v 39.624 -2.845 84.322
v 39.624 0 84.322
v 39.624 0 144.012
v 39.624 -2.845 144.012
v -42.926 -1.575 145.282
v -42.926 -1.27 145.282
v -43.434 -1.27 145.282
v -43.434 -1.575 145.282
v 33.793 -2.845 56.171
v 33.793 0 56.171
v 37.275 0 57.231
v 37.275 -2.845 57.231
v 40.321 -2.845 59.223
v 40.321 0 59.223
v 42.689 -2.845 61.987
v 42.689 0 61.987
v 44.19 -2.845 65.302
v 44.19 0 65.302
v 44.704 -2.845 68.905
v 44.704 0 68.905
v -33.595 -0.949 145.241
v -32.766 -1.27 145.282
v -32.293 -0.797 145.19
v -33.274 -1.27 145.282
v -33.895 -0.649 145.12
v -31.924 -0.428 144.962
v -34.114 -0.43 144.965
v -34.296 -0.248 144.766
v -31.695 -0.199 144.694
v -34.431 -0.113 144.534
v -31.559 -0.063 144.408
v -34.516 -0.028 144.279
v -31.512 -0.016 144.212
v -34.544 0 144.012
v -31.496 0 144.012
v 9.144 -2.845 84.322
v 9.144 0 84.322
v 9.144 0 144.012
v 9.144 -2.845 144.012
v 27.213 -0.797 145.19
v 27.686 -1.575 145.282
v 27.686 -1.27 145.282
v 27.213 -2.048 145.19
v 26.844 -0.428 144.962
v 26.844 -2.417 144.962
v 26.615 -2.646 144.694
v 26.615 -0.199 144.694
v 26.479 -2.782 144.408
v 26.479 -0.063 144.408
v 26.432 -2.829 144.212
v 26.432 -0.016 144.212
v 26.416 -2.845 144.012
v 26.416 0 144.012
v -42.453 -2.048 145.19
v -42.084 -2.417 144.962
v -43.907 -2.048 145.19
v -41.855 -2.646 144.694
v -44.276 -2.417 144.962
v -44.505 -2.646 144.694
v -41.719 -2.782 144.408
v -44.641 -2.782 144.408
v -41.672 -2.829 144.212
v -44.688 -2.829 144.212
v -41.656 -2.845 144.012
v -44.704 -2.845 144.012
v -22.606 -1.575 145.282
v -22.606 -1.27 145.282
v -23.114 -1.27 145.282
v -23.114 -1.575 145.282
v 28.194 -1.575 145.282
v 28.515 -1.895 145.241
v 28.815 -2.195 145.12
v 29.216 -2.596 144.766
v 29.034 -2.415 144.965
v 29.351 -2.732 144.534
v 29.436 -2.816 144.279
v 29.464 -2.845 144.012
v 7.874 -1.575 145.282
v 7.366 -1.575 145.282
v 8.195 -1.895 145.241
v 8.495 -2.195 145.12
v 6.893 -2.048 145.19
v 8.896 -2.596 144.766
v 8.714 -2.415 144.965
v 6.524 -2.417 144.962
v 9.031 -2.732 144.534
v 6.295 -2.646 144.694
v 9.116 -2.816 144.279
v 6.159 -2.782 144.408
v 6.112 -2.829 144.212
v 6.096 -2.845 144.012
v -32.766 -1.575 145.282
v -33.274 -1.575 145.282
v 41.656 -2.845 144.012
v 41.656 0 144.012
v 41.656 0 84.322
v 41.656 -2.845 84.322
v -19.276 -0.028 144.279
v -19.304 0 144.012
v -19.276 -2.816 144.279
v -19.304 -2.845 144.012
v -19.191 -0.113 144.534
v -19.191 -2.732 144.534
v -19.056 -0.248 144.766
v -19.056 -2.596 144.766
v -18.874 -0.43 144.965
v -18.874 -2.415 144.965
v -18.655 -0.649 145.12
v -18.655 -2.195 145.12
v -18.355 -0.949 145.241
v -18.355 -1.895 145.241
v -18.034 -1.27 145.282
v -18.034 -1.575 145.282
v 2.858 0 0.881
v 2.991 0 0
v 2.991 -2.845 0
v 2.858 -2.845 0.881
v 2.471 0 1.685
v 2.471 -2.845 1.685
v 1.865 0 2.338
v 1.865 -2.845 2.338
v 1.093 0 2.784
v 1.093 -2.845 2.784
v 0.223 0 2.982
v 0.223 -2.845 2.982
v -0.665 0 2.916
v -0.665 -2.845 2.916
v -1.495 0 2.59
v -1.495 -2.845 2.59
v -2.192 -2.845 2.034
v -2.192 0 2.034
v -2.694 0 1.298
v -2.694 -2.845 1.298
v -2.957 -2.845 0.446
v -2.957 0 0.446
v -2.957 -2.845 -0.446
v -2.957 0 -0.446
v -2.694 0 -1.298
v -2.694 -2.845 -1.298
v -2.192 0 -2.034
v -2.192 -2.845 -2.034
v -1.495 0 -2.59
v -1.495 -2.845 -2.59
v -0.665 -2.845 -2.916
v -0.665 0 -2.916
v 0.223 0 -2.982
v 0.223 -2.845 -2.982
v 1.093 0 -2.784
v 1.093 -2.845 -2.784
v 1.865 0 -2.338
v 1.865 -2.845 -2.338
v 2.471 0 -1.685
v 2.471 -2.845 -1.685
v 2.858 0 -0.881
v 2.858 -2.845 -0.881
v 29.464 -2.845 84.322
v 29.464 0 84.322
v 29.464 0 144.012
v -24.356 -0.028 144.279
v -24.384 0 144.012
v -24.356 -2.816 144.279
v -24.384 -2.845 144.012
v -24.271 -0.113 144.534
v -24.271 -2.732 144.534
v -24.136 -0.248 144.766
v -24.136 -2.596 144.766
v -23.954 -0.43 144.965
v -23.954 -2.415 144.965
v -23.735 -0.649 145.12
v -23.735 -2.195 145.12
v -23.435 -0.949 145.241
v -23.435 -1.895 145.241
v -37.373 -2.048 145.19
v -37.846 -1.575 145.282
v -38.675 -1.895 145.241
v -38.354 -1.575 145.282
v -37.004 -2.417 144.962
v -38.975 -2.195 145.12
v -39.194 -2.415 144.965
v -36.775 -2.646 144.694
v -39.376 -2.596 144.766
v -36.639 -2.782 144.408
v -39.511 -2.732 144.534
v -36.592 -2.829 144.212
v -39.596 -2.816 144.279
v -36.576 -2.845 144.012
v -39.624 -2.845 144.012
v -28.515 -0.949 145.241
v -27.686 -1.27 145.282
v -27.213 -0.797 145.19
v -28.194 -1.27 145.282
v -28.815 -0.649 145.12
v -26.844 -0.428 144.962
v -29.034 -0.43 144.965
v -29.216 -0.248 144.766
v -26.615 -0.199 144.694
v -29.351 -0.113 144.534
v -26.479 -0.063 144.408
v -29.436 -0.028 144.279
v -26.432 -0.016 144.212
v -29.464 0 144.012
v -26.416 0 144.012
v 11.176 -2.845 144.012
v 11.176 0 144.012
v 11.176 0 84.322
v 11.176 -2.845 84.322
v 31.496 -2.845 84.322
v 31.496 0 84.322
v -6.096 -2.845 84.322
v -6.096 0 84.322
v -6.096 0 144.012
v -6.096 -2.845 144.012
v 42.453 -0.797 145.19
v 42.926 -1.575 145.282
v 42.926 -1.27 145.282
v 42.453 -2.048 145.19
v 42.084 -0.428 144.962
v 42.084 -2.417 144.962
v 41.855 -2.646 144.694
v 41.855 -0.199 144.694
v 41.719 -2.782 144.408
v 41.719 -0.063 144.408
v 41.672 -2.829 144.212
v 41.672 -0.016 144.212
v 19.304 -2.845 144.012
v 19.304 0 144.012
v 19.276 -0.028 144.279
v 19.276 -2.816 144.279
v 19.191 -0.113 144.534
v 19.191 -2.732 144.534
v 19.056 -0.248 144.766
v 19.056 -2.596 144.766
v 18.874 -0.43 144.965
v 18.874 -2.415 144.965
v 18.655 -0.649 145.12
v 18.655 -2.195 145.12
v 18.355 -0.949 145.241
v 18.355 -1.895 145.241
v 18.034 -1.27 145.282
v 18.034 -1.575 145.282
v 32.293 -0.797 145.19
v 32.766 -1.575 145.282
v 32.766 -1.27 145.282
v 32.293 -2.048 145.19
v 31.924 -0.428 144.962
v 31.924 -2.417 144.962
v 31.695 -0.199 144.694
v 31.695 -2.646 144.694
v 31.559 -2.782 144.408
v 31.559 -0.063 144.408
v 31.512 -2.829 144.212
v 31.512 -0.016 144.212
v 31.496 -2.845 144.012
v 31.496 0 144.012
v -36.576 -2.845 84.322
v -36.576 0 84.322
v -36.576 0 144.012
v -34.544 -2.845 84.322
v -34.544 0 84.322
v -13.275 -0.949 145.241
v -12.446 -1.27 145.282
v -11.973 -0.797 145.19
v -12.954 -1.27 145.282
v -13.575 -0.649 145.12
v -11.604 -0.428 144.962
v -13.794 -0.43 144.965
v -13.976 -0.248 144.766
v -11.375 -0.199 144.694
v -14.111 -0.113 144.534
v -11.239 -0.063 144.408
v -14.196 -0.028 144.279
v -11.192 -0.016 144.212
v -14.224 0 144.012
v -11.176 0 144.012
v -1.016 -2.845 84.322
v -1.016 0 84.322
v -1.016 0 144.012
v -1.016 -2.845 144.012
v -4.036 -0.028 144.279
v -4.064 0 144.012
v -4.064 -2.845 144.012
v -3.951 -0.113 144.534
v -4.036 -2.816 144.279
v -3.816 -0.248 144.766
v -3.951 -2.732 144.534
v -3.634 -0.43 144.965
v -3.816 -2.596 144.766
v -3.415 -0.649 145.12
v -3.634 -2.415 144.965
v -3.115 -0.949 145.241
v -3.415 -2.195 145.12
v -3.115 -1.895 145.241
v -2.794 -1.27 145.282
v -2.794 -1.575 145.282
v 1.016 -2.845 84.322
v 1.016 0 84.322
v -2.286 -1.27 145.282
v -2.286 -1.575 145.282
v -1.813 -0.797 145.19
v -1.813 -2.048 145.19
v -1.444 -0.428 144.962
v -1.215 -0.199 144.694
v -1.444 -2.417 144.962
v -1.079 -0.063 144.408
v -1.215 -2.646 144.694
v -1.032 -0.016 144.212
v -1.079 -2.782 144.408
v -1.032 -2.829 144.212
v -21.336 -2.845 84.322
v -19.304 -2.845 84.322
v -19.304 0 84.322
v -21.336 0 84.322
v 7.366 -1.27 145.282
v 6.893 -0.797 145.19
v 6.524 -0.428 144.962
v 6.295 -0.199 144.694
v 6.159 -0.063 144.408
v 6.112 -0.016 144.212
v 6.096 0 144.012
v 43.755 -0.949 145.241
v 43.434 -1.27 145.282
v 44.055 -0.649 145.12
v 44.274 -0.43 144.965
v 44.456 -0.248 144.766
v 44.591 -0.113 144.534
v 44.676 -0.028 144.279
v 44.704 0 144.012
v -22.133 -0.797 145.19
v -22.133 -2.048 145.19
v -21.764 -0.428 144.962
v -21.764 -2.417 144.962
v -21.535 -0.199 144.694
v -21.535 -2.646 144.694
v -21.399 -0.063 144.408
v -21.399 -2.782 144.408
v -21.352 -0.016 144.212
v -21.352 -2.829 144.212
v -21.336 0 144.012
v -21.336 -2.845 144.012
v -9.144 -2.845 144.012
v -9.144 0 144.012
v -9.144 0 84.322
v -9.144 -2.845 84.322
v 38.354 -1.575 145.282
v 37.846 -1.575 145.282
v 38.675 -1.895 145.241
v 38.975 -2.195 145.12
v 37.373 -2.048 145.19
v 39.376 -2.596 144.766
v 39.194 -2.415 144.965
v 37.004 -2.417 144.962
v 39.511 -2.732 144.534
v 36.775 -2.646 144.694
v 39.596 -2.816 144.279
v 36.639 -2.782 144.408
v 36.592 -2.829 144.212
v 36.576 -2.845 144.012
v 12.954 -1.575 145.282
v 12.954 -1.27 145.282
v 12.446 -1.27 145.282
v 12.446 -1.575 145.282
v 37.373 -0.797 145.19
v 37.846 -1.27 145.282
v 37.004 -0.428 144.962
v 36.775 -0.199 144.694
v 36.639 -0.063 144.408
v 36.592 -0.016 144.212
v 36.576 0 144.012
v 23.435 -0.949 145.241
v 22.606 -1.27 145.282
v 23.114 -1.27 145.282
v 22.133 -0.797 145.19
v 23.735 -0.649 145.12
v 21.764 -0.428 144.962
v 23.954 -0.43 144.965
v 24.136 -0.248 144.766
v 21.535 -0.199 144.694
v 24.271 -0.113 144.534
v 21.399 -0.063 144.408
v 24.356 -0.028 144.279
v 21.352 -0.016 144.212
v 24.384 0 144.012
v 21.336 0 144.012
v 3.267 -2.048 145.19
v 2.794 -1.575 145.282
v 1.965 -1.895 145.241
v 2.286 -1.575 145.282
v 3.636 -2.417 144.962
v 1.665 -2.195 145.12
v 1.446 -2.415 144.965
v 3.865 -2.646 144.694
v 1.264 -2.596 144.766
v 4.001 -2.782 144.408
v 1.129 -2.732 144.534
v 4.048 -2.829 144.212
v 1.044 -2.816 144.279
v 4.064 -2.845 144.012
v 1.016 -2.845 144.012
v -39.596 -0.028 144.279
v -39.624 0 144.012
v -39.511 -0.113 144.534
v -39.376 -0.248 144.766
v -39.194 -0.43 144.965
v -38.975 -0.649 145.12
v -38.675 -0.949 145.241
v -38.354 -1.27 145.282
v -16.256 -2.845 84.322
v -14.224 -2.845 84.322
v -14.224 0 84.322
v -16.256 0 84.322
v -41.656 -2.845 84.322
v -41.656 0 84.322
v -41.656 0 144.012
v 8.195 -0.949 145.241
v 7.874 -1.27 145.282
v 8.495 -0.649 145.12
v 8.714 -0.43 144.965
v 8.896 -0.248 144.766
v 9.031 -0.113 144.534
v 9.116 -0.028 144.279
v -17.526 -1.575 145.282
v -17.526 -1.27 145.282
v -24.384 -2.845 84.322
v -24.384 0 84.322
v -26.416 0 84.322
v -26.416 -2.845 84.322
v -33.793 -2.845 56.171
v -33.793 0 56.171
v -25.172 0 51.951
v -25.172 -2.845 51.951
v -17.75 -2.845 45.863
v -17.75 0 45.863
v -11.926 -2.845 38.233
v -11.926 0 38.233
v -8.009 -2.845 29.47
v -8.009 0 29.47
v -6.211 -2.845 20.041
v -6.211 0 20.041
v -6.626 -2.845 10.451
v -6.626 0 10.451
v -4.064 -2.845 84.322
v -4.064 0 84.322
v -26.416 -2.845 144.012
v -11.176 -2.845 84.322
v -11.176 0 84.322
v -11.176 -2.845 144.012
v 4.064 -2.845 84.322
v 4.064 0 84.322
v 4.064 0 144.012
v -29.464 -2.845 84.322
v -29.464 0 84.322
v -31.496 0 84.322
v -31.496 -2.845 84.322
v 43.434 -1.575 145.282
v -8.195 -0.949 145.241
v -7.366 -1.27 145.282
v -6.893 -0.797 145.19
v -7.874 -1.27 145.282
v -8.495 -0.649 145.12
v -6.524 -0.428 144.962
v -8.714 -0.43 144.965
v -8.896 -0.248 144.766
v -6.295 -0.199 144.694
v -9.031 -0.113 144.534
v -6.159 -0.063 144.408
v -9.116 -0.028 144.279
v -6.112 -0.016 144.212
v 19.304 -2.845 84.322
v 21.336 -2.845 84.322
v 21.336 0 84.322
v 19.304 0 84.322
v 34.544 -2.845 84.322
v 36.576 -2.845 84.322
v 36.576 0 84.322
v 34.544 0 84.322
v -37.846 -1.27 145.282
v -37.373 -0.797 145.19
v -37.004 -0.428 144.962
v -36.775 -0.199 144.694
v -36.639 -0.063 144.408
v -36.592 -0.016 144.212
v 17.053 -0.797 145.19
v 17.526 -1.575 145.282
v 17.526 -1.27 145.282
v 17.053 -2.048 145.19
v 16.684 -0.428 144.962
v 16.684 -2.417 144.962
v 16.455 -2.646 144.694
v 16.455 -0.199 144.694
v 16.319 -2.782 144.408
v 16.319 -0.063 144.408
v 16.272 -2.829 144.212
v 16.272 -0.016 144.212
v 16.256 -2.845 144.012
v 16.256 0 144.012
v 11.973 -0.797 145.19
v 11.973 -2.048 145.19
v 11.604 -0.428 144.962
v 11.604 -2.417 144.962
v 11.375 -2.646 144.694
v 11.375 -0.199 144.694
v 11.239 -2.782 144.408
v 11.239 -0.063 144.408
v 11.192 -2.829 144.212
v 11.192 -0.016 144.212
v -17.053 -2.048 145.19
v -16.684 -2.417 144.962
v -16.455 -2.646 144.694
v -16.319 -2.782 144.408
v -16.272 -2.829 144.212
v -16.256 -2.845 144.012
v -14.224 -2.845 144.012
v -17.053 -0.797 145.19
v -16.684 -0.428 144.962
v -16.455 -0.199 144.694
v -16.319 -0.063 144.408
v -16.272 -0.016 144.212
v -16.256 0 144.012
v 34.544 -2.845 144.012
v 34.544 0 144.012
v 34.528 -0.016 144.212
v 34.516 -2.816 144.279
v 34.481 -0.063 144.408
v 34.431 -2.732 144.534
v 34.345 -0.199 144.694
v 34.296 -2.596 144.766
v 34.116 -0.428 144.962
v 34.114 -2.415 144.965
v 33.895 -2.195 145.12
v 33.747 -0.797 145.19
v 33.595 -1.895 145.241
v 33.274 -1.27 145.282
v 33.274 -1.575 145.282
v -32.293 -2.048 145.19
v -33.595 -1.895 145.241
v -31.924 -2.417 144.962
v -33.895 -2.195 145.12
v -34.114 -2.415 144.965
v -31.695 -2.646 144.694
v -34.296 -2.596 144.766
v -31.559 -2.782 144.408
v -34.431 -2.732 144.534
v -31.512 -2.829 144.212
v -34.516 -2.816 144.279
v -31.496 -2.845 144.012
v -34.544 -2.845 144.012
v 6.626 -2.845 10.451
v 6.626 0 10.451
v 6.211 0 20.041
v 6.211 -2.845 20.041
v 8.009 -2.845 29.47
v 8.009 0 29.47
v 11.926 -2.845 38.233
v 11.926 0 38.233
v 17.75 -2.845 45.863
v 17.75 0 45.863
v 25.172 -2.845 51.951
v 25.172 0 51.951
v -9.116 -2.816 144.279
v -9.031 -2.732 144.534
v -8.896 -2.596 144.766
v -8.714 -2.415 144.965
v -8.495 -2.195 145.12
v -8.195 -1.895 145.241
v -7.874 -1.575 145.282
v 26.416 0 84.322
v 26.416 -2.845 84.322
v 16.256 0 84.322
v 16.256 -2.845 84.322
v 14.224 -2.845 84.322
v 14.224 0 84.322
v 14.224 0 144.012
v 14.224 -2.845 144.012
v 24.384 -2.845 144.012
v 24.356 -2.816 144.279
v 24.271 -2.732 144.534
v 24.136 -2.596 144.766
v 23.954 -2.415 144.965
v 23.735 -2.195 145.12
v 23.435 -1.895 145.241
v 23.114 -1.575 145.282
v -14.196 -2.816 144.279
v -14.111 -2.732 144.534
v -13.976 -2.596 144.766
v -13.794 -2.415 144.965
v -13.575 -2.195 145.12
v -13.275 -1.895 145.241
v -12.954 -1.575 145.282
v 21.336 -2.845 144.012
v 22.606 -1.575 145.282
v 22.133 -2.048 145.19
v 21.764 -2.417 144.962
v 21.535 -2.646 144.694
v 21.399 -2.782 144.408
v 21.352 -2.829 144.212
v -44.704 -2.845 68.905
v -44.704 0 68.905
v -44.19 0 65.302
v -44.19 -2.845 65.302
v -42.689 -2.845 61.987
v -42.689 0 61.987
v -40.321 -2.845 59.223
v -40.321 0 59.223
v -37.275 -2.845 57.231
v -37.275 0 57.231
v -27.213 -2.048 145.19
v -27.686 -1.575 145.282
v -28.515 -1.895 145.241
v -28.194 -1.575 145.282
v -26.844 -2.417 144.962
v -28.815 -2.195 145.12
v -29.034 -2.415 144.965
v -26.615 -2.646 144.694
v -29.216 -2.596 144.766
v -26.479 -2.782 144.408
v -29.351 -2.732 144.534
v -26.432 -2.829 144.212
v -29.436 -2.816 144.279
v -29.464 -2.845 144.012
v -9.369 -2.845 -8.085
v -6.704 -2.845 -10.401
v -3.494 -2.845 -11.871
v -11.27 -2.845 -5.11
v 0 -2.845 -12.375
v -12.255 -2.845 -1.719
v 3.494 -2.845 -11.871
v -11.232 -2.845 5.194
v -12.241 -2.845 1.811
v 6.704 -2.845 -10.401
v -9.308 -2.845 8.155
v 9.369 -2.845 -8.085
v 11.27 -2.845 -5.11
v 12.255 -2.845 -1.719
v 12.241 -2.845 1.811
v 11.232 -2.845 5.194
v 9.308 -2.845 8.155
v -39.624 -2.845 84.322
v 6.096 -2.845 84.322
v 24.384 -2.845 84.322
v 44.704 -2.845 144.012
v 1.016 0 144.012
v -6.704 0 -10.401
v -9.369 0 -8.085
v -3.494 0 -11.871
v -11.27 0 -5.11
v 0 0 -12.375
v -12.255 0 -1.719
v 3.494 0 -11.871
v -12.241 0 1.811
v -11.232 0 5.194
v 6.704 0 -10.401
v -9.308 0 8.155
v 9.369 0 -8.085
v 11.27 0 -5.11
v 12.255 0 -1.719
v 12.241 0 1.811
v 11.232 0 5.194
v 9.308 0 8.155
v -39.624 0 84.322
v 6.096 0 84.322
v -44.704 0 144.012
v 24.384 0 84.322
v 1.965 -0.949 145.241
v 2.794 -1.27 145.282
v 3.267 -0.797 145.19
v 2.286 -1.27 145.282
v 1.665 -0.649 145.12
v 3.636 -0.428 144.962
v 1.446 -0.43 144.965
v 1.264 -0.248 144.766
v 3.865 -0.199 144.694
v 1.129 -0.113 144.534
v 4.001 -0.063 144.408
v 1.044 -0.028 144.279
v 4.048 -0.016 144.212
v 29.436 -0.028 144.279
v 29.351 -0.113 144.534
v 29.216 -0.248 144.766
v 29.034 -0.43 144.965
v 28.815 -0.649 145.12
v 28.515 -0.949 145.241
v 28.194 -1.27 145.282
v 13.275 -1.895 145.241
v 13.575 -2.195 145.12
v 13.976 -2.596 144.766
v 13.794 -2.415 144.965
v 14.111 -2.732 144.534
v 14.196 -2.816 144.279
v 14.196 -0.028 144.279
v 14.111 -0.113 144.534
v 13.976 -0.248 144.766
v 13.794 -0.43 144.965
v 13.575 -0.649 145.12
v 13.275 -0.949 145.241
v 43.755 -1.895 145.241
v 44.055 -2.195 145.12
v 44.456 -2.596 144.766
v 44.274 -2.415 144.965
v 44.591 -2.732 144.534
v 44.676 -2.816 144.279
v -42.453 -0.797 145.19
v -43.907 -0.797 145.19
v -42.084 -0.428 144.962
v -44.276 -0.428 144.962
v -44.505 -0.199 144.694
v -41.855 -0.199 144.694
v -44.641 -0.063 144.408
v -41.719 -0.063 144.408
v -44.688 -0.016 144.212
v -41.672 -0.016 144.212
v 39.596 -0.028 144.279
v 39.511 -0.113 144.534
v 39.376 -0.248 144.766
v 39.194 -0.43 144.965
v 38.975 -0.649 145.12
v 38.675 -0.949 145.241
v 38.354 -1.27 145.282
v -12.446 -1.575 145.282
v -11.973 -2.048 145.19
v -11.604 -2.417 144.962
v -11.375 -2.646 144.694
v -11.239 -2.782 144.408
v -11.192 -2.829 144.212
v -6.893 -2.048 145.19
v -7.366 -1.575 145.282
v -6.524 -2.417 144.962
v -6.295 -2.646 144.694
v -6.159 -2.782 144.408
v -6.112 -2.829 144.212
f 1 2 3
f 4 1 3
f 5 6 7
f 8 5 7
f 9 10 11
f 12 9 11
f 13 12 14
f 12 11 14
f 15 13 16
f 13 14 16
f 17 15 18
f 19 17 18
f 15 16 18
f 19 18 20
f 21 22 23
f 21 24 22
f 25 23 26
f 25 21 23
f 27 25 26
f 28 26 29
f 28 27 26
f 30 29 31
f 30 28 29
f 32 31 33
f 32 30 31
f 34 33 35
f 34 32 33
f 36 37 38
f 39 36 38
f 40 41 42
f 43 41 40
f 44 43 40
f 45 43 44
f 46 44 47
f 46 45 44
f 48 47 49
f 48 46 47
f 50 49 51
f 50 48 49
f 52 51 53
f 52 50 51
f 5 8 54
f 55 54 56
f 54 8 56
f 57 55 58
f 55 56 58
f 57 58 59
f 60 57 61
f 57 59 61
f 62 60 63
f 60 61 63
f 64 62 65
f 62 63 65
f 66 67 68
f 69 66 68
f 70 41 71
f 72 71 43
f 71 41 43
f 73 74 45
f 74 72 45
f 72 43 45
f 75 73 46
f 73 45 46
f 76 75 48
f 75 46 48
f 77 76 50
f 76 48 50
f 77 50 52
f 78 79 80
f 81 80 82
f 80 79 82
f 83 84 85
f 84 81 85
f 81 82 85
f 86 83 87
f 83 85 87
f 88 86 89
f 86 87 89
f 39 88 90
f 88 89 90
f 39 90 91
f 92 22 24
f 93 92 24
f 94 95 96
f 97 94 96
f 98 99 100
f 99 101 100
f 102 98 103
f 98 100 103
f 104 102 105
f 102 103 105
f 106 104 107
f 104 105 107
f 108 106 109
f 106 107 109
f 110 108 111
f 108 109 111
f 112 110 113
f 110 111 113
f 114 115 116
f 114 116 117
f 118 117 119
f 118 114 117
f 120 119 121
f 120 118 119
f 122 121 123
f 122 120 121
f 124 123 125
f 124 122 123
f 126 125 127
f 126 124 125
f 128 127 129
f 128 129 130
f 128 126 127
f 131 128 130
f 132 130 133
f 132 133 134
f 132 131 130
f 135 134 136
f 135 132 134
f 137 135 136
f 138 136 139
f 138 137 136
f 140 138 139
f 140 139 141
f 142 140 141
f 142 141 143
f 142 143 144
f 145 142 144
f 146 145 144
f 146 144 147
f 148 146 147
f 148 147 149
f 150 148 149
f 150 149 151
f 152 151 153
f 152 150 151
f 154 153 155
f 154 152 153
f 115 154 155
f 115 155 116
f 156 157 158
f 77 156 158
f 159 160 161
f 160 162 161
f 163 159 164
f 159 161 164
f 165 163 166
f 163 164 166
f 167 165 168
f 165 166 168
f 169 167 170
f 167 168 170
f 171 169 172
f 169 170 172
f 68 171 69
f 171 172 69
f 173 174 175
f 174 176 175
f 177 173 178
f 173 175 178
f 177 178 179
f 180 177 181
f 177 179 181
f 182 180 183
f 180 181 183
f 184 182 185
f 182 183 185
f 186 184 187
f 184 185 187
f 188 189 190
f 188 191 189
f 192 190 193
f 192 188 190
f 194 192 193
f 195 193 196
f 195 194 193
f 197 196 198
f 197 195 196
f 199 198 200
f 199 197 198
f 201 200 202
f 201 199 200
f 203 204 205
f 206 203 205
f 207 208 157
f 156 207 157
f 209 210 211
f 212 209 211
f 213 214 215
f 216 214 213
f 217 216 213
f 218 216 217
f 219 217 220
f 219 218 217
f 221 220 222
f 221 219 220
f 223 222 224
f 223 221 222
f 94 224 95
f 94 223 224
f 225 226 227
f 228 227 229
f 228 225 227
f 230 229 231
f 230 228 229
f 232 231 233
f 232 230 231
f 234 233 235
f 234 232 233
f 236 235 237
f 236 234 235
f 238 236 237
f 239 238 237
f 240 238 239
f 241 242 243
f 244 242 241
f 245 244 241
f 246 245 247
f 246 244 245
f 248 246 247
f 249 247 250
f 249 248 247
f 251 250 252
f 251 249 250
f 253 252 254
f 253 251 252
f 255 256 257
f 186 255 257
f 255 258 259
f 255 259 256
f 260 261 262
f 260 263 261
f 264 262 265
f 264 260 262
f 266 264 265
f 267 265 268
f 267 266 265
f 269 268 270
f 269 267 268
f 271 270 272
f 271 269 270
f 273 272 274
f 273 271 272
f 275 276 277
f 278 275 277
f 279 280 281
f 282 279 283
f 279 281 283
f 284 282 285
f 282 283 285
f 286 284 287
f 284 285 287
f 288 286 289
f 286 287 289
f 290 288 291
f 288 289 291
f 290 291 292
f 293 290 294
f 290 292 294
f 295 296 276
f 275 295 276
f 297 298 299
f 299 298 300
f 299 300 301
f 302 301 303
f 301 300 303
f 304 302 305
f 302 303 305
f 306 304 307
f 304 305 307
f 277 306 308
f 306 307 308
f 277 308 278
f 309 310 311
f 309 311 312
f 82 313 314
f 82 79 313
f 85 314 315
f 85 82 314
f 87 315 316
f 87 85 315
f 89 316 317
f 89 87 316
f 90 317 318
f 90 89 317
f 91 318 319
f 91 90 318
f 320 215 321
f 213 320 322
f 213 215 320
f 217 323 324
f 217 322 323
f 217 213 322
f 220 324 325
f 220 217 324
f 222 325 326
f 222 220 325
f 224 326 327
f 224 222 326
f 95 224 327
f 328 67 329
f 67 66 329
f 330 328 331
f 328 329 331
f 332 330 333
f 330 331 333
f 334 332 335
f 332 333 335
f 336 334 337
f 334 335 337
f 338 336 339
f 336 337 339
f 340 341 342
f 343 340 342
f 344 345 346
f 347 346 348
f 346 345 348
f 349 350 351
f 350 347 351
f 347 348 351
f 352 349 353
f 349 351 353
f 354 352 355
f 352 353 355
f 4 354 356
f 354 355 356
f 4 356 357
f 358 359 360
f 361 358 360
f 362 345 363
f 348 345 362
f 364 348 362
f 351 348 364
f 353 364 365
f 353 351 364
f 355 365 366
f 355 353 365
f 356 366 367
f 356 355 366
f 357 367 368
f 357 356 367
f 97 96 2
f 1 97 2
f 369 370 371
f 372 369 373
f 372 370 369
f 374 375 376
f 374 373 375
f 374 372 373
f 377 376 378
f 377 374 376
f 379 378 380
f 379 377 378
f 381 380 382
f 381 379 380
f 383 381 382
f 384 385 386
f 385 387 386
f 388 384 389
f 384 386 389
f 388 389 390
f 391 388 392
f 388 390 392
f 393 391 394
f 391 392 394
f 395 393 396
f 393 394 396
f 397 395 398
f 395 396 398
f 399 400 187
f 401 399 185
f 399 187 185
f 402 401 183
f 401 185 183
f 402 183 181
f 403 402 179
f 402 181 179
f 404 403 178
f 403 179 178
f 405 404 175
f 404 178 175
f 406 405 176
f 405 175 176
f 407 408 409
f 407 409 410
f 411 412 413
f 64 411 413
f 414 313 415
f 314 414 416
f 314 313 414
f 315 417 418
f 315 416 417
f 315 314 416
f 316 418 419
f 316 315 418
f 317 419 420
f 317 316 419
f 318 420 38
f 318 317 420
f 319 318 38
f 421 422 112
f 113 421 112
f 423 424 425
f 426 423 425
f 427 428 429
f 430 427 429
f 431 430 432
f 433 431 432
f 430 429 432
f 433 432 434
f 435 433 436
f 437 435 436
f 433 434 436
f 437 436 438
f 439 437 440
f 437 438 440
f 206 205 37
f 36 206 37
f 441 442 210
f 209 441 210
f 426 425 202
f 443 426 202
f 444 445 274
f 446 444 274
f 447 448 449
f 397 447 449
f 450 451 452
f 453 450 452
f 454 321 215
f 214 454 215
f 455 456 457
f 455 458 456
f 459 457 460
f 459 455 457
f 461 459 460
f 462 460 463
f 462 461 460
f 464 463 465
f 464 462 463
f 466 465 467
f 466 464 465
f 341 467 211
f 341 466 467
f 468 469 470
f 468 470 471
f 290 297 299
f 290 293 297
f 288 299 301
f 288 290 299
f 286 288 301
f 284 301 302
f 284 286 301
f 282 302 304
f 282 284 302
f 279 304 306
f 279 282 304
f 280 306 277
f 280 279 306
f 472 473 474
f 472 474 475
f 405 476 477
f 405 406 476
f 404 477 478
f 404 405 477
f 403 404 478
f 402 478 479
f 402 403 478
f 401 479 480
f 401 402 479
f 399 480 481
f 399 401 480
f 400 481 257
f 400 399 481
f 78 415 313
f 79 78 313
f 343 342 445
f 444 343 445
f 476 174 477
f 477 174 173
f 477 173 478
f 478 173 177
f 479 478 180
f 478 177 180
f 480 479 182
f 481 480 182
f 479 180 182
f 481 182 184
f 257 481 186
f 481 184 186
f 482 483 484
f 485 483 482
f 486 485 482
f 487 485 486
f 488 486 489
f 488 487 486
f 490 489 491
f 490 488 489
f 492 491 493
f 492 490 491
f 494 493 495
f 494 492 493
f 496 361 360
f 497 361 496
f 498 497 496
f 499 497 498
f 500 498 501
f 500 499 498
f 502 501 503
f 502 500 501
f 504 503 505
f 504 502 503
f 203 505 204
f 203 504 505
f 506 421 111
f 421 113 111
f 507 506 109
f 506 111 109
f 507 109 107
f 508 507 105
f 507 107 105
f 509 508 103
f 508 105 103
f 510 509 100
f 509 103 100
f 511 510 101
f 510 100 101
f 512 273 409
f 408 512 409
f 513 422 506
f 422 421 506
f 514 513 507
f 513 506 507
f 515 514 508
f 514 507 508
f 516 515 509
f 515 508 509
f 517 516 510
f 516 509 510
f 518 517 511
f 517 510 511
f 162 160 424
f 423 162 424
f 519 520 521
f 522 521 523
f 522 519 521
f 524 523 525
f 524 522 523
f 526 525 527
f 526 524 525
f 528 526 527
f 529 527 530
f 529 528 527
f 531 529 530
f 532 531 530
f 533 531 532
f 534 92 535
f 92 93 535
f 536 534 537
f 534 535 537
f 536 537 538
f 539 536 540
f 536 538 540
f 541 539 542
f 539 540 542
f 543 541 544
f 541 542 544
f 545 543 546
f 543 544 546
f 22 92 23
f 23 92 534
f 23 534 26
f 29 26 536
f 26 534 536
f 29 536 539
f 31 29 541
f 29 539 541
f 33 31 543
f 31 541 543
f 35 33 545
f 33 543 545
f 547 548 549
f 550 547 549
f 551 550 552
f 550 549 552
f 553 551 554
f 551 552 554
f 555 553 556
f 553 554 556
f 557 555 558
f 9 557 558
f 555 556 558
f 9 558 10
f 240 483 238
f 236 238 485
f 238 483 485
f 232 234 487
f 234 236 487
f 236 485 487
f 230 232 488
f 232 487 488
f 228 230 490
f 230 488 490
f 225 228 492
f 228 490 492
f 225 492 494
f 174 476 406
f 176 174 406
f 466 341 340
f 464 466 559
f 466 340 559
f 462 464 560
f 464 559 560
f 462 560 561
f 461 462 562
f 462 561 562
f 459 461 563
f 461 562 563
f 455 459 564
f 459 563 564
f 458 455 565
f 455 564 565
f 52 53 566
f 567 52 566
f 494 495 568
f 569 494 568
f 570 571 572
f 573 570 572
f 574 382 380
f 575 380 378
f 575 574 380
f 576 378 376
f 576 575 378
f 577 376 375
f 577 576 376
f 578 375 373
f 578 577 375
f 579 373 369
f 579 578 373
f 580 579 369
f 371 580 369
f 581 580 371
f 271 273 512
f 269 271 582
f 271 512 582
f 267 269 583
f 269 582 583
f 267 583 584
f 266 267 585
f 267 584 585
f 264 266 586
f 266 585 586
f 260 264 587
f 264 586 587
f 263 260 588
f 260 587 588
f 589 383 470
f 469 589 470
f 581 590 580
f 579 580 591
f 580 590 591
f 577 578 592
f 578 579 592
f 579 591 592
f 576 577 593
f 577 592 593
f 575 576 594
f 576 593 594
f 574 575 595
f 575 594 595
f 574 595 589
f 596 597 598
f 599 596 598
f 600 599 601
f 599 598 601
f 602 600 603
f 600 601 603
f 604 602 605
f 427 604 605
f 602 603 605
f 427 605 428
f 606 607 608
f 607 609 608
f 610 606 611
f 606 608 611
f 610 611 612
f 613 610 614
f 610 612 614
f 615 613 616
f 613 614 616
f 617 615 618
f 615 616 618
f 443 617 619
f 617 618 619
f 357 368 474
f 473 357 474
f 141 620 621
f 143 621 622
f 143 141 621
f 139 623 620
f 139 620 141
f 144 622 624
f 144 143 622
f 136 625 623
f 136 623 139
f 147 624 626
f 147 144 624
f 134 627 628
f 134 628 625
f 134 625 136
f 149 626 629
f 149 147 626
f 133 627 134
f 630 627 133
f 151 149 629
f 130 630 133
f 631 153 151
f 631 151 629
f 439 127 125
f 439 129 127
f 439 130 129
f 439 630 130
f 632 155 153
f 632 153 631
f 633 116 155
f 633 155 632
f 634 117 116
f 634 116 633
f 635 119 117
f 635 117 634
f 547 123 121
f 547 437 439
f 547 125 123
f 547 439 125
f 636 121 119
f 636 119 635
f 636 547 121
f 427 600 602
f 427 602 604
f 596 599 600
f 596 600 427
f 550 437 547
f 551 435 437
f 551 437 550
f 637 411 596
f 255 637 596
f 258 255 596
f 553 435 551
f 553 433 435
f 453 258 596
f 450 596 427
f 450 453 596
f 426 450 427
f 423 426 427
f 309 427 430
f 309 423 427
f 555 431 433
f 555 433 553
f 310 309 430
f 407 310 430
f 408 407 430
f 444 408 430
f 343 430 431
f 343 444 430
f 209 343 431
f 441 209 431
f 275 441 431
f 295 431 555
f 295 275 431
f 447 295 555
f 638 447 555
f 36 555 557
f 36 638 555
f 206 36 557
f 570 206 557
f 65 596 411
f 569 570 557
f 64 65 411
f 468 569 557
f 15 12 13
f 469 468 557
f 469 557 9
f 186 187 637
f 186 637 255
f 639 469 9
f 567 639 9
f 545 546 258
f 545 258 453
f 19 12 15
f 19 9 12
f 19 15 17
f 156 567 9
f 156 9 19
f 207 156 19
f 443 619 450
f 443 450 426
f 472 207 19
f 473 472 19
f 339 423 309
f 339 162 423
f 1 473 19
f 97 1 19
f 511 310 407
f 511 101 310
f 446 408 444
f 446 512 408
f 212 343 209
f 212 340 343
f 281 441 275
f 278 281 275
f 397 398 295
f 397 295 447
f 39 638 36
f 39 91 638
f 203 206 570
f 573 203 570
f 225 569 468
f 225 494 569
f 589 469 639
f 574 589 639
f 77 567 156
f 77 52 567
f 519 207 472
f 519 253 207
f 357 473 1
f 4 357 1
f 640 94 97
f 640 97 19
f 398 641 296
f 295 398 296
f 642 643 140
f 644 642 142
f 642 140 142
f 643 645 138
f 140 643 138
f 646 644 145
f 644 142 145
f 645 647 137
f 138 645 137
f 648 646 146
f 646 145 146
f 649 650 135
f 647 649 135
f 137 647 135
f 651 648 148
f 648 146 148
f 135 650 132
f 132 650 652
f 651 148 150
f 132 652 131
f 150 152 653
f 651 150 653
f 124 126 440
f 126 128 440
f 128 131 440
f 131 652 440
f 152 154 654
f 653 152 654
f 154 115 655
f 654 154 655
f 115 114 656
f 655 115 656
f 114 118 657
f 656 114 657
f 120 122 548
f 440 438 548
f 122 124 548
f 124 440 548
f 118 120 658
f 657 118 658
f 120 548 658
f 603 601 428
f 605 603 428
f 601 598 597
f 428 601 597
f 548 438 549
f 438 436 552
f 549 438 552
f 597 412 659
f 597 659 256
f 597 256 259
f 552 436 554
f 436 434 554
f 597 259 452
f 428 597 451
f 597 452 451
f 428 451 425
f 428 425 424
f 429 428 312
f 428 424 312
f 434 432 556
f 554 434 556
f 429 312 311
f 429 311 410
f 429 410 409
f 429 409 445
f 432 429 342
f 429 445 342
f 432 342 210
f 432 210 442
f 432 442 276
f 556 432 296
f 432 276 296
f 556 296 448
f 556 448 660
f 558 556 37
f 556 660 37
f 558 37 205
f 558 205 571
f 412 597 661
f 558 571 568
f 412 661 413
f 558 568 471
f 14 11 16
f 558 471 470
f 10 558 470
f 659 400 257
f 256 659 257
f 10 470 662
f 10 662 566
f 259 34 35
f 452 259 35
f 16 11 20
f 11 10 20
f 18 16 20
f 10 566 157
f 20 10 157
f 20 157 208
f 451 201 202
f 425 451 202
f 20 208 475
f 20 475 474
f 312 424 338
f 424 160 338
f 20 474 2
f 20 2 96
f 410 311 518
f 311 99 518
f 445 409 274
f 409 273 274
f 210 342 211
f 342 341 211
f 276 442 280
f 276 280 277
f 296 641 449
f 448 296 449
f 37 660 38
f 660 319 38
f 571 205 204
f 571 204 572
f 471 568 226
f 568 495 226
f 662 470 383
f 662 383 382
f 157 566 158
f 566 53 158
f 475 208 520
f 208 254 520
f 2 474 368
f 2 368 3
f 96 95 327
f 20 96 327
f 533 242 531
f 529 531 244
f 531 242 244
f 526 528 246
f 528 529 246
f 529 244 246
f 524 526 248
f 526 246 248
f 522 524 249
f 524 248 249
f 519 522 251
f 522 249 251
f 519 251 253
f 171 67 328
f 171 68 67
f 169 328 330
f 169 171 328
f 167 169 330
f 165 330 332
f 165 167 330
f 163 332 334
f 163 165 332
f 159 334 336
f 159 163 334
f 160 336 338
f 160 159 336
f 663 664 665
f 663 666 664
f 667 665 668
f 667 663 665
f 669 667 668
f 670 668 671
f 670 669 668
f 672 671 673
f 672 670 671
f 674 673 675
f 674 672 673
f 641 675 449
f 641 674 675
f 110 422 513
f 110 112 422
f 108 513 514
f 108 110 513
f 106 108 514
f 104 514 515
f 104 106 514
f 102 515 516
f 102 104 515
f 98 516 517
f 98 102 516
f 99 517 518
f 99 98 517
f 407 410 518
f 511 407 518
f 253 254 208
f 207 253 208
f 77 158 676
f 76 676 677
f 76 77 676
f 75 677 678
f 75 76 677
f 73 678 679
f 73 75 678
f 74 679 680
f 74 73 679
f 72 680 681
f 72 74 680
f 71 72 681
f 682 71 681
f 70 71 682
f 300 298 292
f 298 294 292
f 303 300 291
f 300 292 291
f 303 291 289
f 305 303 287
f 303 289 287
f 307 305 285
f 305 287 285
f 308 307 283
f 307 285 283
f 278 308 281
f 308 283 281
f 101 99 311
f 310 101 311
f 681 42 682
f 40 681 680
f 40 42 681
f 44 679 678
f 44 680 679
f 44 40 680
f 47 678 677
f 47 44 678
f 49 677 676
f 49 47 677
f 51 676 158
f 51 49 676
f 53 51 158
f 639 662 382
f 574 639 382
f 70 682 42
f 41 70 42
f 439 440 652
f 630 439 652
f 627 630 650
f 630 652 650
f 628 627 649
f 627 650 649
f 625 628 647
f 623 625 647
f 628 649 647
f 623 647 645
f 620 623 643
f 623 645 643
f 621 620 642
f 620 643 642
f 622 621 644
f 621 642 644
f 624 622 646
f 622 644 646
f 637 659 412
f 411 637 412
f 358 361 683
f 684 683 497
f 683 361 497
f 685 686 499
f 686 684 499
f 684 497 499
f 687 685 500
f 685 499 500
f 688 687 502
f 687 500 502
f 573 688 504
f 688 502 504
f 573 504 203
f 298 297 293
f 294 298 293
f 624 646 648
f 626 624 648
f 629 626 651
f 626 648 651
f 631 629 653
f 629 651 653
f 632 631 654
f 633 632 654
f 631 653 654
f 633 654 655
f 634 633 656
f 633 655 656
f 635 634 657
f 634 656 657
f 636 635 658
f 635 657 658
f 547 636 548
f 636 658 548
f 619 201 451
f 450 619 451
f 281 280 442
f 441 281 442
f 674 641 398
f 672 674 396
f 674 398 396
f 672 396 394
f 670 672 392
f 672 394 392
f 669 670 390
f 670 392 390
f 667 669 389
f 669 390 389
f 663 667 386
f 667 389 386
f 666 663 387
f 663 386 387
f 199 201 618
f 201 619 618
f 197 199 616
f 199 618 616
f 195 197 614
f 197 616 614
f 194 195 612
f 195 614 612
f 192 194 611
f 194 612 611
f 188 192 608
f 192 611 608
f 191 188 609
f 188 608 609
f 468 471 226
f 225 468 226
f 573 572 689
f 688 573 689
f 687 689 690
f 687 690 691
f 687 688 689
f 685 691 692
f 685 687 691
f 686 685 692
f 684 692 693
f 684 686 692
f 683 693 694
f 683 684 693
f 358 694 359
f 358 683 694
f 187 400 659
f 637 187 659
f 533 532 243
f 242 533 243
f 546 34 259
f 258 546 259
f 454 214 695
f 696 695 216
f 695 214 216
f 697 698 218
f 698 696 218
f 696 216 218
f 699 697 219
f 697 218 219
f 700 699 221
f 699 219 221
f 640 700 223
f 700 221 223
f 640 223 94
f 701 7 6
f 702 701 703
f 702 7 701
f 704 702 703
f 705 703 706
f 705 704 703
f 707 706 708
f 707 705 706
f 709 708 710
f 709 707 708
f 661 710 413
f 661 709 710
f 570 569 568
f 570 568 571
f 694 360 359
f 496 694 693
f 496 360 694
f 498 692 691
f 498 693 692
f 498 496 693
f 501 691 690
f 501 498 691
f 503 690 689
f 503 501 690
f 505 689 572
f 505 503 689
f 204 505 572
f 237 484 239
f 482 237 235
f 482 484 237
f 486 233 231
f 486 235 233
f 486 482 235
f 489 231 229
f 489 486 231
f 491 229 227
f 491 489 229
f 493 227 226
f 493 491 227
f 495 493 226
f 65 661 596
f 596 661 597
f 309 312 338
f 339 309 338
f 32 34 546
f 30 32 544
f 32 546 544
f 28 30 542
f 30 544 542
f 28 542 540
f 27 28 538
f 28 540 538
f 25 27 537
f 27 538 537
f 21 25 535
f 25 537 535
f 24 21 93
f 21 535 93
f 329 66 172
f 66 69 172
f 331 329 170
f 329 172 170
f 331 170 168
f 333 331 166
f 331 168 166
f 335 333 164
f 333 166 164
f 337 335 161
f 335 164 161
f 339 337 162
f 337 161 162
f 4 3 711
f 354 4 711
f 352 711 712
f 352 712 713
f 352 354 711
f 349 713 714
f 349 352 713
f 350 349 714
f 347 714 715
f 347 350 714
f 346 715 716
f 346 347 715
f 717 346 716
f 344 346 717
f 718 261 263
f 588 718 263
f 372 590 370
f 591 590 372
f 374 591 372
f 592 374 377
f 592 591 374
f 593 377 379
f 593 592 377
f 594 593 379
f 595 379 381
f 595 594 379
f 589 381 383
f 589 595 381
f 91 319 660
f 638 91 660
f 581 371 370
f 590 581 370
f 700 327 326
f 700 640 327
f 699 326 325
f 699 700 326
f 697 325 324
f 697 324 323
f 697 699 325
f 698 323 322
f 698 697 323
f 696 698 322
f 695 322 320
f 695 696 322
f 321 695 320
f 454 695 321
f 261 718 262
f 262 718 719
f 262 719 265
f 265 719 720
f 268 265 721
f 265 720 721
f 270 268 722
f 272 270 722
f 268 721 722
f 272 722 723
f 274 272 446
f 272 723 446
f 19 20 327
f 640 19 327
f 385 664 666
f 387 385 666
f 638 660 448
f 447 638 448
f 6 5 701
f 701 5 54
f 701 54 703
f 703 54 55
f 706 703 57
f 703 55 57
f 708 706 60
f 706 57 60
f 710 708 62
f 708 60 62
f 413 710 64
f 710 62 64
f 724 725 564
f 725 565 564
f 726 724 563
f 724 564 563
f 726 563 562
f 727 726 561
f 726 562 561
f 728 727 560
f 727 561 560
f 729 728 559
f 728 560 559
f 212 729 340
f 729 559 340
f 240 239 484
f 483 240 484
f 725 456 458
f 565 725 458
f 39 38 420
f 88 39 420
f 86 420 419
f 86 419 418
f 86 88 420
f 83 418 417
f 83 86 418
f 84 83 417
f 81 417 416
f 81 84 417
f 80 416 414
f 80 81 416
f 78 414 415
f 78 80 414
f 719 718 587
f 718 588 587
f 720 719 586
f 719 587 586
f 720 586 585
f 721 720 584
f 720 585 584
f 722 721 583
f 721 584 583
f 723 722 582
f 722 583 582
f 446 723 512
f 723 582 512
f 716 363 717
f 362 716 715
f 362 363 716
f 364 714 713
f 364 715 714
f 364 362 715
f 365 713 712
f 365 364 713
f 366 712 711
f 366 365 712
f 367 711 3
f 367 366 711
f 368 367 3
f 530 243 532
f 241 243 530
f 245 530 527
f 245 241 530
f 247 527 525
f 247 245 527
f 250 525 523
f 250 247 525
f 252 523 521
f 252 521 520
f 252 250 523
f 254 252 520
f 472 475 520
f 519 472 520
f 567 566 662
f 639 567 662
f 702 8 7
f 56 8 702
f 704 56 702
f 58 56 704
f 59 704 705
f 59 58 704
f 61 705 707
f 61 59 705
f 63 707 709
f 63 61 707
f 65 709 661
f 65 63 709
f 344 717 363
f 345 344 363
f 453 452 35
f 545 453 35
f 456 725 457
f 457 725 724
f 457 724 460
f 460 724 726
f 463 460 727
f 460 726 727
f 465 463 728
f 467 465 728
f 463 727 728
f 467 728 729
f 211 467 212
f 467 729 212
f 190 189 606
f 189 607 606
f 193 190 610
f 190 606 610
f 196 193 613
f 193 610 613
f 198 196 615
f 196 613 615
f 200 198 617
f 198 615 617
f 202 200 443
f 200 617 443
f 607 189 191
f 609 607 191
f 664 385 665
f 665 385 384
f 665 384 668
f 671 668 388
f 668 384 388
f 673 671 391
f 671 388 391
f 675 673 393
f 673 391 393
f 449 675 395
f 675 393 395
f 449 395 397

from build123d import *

# Parameters (mm, degrees)
F0_R     = 3.7382012242
F1_DEPTH = 3.556
F3_SCALE = 0.8
F4_R     = 1.27


with BuildPart() as f1:
    # F0 (on Front) → F1 (new body)
    with BuildSketch(Plane.XZ):
        with BuildLine():
            Line((-52.07, 181.6023319495), (-55.88, 181.6023319495))
            Line((-55.88, 181.6023319495), (-55.88, 86.1316665151))
            ThreePointArc((-55.88, 86.1316665151), (-52.0040063032, 75.6508869522), (-42.2413344101, 70.2139480257))
            ThreePointArc((-42.2413344101, 70.2139480257), (-14.9072200491, 47.7917837992), (-8.2826688201, 13.0639480257))
            ThreePointArc((-8.2826688201, 13.0639480257), (-14.8550807048, -4.3122984655), (0, -15.4683334849))
            ThreePointArc((0, -15.4683334849), (14.8550807048, -4.3122984655), (8.2826688201, 13.0639480257))
            ThreePointArc((8.2826688201, 13.0639480257), (14.9072200491, 47.7917837992), (42.2413344101, 70.2139480257))
            ThreePointArc((42.2413344101, 70.2139480257), (52.0040063032, 75.6508869522), (55.88, 86.1316665151))
            Line((55.88, 86.1316665151), (55.88, 181.6023319495))
            Line((55.88, 181.6023319495), (52.07, 181.6023319495))
            Line((52.07, 181.6023319495), (52.07, 105.4023319495))
            Line((52.07, 105.4023319495), (49.53, 105.4023319495))
            Line((49.53, 105.4023319495), (49.53, 181.6023319495))
            Line((49.53, 181.6023319495), (45.72, 181.6023319495))
            Line((45.72, 181.6023319495), (45.72, 105.4023319495))
            Line((45.72, 105.4023319495), (43.18, 105.4023319495))
            Line((43.18, 105.4023319495), (43.18, 181.6023319495))
            Line((43.18, 181.6023319495), (39.37, 181.6023319495))
            Line((39.37, 181.6023319495), (39.37, 105.4023319495))
            Line((39.37, 105.4023319495), (36.83, 105.4023319495))
            Line((36.83, 105.4023319495), (36.83, 181.6023319495))
            Line((36.83, 181.6023319495), (33.02, 181.6023319495))
            Line((33.02, 181.6023319495), (33.02, 105.4023319495))
            Line((33.02, 105.4023319495), (30.48, 105.4023319495))
            Line((30.48, 105.4023319495), (30.48, 181.6023319495))
            Line((30.48, 181.6023319495), (26.67, 181.6023319495))
            Line((26.67, 181.6023319495), (26.67, 105.4023319495))
            Line((26.67, 105.4023319495), (24.13, 105.4023319495))
            Line((24.13, 105.4023319495), (24.13, 181.6023319495))
            Line((24.13, 181.6023319495), (20.32, 181.6023319495))
            Line((20.32, 181.6023319495), (20.32, 105.4023319495))
            Line((20.32, 105.4023319495), (17.78, 105.4023319495))
            Line((17.78, 105.4023319495), (17.78, 181.6023319495))
            Line((17.78, 181.6023319495), (13.97, 181.6023319495))
            Line((13.97, 181.6023319495), (13.97, 105.4023319495))
            Line((13.97, 105.4023319495), (11.43, 105.4023319495))
            Line((11.43, 105.4023319495), (11.43, 181.6023319495))
            Line((11.43, 181.6023319495), (7.62, 181.6023319495))
            Line((7.62, 181.6023319495), (7.62, 105.4023319495))
            Line((7.62, 105.4023319495), (5.08, 105.4023319495))
            Line((5.08, 105.4023319495), (5.08, 181.6023319495))
            Line((5.08, 181.6023319495), (1.27, 181.6023319495))
            Line((1.27, 181.6023319495), (1.27, 105.4023319495))
            Line((1.27, 105.4023319495), (-1.27, 105.4023319495))
            Line((-1.27, 105.4023319495), (-1.27, 181.6023319495))
            Line((-1.27, 181.6023319495), (-5.08, 181.6023319495))
            Line((-5.08, 181.6023319495), (-5.08, 105.4023319495))
            Line((-5.08, 105.4023319495), (-7.62, 105.4023319495))
            Line((-7.62, 105.4023319495), (-7.62, 181.6023319495))
            Line((-7.62, 181.6023319495), (-11.43, 181.6023319495))
            Line((-11.43, 181.6023319495), (-11.43, 105.4023319495))
            Line((-11.43, 105.4023319495), (-13.97, 105.4023319495))
            Line((-13.97, 105.4023319495), (-13.97, 181.6023319495))
            Line((-13.97, 181.6023319495), (-17.78, 181.6023319495))
            Line((-17.78, 181.6023319495), (-17.78, 105.4023319495))
            Line((-17.78, 105.4023319495), (-20.32, 105.4023319495))
            Line((-20.32, 105.4023319495), (-20.32, 181.6023319495))
            Line((-20.32, 181.6023319495), (-24.13, 181.6023319495))
            Line((-24.13, 181.6023319495), (-24.13, 105.4023319495))
            Line((-24.13, 105.4023319495), (-26.67, 105.4023319495))
            Line((-26.67, 105.4023319495), (-26.67, 181.6023319495))
            Line((-26.67, 181.6023319495), (-30.48, 181.6023319495))
            Line((-30.48, 181.6023319495), (-30.48, 105.4023319495))
            Line((-30.48, 105.4023319495), (-33.02, 105.4023319495))
            Line((-33.02, 105.4023319495), (-33.02, 181.6023319495))
            Line((-33.02, 181.6023319495), (-36.83, 181.6023319495))
            Line((-36.83, 181.6023319495), (-36.83, 105.4023319495))
            Line((-36.83, 105.4023319495), (-39.37, 105.4023319495))
            Line((-39.37, 105.4023319495), (-39.37, 181.6023319495))
            Line((-39.37, 181.6023319495), (-43.18, 181.6023319495))
            Line((-43.18, 181.6023319495), (-43.18, 105.4023319495))
            Line((-43.18, 105.4023319495), (-45.72, 105.4023319495))
            Line((-45.72, 105.4023319495), (-45.72, 181.6023319495))
            Line((-45.72, 181.6023319495), (-49.53, 181.6023319495))
            Line((-49.53, 181.6023319495), (-49.53, 105.4023319495))
            Line((-49.53, 105.4023319495), (-52.07, 105.4023319495))
            Line((-52.07, 105.4023319495), (-52.07, 181.6023319495))
        make_face()
        Circle(F0_R, mode=Mode.SUBTRACT)
    extrude(amount=F1_DEPTH)


with BuildPart() as f1_1:
    # F3: moved
    add(f1.part.scale(F3_SCALE))

    # F4
    f4_edges = [f1_1.edges().sort_by_distance(p)[0] for p in [
        (33.02, 0, 145.281866),
        (31.496, -1.4224, 145.281866),
        (34.544, -1.4224, 145.281866),
        (39.624, -1.4224, 145.281866),
        (36.576, -1.4224, 145.281866),
        (38.1, 0, 145.281866),
        (38.1, -2.8448, 145.281866),
        (44.704, -1.4224, 145.281866),
        (41.656, -1.4224, 145.281866),
        (43.18, 0, 145.281866),
        (43.18, -2.8448, 145.281866),
        (29.464, -1.4224, 145.281866),
        (26.416, -1.4224, 145.281866),
        (27.94, 0, 145.281866),
        (27.94, -2.8448, 145.281866),
        (24.384, -1.4224, 145.281866),
        (21.336, -1.4224, 145.281866),
        (22.86, 0, 145.281866),
        (22.86, -2.8448, 145.281866),
        (19.304, -1.4224, 145.281866),
        (16.256, -1.4224, 145.281866),
        (17.78, 0, 145.281866),
        (17.78, -2.8448, 145.281866),
        (14.224, -1.4224, 145.281866),
        (11.176, -1.4224, 145.281866),
        (12.7, 0, 145.281866),
        (12.7, -2.8448, 145.281866),
        (9.144, -1.4224, 145.281866),
        (6.096, -1.4224, 145.281866),
        (7.62, 0, 145.281866),
        (7.62, -2.8448, 145.281866),
        (4.064, -1.4224, 145.281866),
        (1.016, -1.4224, 145.281866),
        (2.54, 0, 145.281866),
        (2.54, -2.8448, 145.281866),
        (-1.016, -1.4224, 145.281866),
        (-4.064, -1.4224, 145.281866),
        (-2.54, 0, 145.281866),
        (-2.54, -2.8448, 145.281866),
        (-6.096, -1.4224, 145.281866),
        (-9.144, -1.4224, 145.281866),
        (-7.62, 0, 145.281866),
        (-7.62, -2.8448, 145.281866),
        (-11.176, -1.4224, 145.281866),
        (-14.224, -1.4224, 145.281866),
        (-12.7, 0, 145.281866),
        (-12.7, -2.8448, 145.281866),
        (-16.256, -1.4224, 145.281866),
        (-19.304, -1.4224, 145.281866),
        (-17.78, 0, 145.281866),
        (-17.78, -2.8448, 145.281866),
        (-21.336, -1.4224, 145.281866),
        (-24.384, -1.4224, 145.281866),
        (-22.86, 0, 145.281866),
        (-22.86, -2.8448, 145.281866),
        (-26.416, -1.4224, 145.281866),
        (-29.464, -1.4224, 145.281866),
        (-27.94, 0, 145.281866),
        (-27.94, -2.8448, 145.281866),
        (-31.496, -1.4224, 145.281866),
        (-34.544, -1.4224, 145.281866),
        (-33.02, 0, 145.281866),
        (-33.02, -2.8448, 145.281866),
        (-36.576, -1.4224, 145.281866),
        (-39.624, -1.4224, 145.281866),
        (-38.1, 0, 145.281866),
        (-38.1, -2.8448, 145.281866),
        (-41.656, -1.4224, 145.281866),
        (-44.704, -1.4224, 145.281866),
        (-43.18, 0, 145.281866),
        (-43.18, -2.8448, 145.281866),
        (33.02, -2.8448, 145.281866),
    ]]
    fillet(f4_edges, radius=F4_R)


solid = f1_1.part
